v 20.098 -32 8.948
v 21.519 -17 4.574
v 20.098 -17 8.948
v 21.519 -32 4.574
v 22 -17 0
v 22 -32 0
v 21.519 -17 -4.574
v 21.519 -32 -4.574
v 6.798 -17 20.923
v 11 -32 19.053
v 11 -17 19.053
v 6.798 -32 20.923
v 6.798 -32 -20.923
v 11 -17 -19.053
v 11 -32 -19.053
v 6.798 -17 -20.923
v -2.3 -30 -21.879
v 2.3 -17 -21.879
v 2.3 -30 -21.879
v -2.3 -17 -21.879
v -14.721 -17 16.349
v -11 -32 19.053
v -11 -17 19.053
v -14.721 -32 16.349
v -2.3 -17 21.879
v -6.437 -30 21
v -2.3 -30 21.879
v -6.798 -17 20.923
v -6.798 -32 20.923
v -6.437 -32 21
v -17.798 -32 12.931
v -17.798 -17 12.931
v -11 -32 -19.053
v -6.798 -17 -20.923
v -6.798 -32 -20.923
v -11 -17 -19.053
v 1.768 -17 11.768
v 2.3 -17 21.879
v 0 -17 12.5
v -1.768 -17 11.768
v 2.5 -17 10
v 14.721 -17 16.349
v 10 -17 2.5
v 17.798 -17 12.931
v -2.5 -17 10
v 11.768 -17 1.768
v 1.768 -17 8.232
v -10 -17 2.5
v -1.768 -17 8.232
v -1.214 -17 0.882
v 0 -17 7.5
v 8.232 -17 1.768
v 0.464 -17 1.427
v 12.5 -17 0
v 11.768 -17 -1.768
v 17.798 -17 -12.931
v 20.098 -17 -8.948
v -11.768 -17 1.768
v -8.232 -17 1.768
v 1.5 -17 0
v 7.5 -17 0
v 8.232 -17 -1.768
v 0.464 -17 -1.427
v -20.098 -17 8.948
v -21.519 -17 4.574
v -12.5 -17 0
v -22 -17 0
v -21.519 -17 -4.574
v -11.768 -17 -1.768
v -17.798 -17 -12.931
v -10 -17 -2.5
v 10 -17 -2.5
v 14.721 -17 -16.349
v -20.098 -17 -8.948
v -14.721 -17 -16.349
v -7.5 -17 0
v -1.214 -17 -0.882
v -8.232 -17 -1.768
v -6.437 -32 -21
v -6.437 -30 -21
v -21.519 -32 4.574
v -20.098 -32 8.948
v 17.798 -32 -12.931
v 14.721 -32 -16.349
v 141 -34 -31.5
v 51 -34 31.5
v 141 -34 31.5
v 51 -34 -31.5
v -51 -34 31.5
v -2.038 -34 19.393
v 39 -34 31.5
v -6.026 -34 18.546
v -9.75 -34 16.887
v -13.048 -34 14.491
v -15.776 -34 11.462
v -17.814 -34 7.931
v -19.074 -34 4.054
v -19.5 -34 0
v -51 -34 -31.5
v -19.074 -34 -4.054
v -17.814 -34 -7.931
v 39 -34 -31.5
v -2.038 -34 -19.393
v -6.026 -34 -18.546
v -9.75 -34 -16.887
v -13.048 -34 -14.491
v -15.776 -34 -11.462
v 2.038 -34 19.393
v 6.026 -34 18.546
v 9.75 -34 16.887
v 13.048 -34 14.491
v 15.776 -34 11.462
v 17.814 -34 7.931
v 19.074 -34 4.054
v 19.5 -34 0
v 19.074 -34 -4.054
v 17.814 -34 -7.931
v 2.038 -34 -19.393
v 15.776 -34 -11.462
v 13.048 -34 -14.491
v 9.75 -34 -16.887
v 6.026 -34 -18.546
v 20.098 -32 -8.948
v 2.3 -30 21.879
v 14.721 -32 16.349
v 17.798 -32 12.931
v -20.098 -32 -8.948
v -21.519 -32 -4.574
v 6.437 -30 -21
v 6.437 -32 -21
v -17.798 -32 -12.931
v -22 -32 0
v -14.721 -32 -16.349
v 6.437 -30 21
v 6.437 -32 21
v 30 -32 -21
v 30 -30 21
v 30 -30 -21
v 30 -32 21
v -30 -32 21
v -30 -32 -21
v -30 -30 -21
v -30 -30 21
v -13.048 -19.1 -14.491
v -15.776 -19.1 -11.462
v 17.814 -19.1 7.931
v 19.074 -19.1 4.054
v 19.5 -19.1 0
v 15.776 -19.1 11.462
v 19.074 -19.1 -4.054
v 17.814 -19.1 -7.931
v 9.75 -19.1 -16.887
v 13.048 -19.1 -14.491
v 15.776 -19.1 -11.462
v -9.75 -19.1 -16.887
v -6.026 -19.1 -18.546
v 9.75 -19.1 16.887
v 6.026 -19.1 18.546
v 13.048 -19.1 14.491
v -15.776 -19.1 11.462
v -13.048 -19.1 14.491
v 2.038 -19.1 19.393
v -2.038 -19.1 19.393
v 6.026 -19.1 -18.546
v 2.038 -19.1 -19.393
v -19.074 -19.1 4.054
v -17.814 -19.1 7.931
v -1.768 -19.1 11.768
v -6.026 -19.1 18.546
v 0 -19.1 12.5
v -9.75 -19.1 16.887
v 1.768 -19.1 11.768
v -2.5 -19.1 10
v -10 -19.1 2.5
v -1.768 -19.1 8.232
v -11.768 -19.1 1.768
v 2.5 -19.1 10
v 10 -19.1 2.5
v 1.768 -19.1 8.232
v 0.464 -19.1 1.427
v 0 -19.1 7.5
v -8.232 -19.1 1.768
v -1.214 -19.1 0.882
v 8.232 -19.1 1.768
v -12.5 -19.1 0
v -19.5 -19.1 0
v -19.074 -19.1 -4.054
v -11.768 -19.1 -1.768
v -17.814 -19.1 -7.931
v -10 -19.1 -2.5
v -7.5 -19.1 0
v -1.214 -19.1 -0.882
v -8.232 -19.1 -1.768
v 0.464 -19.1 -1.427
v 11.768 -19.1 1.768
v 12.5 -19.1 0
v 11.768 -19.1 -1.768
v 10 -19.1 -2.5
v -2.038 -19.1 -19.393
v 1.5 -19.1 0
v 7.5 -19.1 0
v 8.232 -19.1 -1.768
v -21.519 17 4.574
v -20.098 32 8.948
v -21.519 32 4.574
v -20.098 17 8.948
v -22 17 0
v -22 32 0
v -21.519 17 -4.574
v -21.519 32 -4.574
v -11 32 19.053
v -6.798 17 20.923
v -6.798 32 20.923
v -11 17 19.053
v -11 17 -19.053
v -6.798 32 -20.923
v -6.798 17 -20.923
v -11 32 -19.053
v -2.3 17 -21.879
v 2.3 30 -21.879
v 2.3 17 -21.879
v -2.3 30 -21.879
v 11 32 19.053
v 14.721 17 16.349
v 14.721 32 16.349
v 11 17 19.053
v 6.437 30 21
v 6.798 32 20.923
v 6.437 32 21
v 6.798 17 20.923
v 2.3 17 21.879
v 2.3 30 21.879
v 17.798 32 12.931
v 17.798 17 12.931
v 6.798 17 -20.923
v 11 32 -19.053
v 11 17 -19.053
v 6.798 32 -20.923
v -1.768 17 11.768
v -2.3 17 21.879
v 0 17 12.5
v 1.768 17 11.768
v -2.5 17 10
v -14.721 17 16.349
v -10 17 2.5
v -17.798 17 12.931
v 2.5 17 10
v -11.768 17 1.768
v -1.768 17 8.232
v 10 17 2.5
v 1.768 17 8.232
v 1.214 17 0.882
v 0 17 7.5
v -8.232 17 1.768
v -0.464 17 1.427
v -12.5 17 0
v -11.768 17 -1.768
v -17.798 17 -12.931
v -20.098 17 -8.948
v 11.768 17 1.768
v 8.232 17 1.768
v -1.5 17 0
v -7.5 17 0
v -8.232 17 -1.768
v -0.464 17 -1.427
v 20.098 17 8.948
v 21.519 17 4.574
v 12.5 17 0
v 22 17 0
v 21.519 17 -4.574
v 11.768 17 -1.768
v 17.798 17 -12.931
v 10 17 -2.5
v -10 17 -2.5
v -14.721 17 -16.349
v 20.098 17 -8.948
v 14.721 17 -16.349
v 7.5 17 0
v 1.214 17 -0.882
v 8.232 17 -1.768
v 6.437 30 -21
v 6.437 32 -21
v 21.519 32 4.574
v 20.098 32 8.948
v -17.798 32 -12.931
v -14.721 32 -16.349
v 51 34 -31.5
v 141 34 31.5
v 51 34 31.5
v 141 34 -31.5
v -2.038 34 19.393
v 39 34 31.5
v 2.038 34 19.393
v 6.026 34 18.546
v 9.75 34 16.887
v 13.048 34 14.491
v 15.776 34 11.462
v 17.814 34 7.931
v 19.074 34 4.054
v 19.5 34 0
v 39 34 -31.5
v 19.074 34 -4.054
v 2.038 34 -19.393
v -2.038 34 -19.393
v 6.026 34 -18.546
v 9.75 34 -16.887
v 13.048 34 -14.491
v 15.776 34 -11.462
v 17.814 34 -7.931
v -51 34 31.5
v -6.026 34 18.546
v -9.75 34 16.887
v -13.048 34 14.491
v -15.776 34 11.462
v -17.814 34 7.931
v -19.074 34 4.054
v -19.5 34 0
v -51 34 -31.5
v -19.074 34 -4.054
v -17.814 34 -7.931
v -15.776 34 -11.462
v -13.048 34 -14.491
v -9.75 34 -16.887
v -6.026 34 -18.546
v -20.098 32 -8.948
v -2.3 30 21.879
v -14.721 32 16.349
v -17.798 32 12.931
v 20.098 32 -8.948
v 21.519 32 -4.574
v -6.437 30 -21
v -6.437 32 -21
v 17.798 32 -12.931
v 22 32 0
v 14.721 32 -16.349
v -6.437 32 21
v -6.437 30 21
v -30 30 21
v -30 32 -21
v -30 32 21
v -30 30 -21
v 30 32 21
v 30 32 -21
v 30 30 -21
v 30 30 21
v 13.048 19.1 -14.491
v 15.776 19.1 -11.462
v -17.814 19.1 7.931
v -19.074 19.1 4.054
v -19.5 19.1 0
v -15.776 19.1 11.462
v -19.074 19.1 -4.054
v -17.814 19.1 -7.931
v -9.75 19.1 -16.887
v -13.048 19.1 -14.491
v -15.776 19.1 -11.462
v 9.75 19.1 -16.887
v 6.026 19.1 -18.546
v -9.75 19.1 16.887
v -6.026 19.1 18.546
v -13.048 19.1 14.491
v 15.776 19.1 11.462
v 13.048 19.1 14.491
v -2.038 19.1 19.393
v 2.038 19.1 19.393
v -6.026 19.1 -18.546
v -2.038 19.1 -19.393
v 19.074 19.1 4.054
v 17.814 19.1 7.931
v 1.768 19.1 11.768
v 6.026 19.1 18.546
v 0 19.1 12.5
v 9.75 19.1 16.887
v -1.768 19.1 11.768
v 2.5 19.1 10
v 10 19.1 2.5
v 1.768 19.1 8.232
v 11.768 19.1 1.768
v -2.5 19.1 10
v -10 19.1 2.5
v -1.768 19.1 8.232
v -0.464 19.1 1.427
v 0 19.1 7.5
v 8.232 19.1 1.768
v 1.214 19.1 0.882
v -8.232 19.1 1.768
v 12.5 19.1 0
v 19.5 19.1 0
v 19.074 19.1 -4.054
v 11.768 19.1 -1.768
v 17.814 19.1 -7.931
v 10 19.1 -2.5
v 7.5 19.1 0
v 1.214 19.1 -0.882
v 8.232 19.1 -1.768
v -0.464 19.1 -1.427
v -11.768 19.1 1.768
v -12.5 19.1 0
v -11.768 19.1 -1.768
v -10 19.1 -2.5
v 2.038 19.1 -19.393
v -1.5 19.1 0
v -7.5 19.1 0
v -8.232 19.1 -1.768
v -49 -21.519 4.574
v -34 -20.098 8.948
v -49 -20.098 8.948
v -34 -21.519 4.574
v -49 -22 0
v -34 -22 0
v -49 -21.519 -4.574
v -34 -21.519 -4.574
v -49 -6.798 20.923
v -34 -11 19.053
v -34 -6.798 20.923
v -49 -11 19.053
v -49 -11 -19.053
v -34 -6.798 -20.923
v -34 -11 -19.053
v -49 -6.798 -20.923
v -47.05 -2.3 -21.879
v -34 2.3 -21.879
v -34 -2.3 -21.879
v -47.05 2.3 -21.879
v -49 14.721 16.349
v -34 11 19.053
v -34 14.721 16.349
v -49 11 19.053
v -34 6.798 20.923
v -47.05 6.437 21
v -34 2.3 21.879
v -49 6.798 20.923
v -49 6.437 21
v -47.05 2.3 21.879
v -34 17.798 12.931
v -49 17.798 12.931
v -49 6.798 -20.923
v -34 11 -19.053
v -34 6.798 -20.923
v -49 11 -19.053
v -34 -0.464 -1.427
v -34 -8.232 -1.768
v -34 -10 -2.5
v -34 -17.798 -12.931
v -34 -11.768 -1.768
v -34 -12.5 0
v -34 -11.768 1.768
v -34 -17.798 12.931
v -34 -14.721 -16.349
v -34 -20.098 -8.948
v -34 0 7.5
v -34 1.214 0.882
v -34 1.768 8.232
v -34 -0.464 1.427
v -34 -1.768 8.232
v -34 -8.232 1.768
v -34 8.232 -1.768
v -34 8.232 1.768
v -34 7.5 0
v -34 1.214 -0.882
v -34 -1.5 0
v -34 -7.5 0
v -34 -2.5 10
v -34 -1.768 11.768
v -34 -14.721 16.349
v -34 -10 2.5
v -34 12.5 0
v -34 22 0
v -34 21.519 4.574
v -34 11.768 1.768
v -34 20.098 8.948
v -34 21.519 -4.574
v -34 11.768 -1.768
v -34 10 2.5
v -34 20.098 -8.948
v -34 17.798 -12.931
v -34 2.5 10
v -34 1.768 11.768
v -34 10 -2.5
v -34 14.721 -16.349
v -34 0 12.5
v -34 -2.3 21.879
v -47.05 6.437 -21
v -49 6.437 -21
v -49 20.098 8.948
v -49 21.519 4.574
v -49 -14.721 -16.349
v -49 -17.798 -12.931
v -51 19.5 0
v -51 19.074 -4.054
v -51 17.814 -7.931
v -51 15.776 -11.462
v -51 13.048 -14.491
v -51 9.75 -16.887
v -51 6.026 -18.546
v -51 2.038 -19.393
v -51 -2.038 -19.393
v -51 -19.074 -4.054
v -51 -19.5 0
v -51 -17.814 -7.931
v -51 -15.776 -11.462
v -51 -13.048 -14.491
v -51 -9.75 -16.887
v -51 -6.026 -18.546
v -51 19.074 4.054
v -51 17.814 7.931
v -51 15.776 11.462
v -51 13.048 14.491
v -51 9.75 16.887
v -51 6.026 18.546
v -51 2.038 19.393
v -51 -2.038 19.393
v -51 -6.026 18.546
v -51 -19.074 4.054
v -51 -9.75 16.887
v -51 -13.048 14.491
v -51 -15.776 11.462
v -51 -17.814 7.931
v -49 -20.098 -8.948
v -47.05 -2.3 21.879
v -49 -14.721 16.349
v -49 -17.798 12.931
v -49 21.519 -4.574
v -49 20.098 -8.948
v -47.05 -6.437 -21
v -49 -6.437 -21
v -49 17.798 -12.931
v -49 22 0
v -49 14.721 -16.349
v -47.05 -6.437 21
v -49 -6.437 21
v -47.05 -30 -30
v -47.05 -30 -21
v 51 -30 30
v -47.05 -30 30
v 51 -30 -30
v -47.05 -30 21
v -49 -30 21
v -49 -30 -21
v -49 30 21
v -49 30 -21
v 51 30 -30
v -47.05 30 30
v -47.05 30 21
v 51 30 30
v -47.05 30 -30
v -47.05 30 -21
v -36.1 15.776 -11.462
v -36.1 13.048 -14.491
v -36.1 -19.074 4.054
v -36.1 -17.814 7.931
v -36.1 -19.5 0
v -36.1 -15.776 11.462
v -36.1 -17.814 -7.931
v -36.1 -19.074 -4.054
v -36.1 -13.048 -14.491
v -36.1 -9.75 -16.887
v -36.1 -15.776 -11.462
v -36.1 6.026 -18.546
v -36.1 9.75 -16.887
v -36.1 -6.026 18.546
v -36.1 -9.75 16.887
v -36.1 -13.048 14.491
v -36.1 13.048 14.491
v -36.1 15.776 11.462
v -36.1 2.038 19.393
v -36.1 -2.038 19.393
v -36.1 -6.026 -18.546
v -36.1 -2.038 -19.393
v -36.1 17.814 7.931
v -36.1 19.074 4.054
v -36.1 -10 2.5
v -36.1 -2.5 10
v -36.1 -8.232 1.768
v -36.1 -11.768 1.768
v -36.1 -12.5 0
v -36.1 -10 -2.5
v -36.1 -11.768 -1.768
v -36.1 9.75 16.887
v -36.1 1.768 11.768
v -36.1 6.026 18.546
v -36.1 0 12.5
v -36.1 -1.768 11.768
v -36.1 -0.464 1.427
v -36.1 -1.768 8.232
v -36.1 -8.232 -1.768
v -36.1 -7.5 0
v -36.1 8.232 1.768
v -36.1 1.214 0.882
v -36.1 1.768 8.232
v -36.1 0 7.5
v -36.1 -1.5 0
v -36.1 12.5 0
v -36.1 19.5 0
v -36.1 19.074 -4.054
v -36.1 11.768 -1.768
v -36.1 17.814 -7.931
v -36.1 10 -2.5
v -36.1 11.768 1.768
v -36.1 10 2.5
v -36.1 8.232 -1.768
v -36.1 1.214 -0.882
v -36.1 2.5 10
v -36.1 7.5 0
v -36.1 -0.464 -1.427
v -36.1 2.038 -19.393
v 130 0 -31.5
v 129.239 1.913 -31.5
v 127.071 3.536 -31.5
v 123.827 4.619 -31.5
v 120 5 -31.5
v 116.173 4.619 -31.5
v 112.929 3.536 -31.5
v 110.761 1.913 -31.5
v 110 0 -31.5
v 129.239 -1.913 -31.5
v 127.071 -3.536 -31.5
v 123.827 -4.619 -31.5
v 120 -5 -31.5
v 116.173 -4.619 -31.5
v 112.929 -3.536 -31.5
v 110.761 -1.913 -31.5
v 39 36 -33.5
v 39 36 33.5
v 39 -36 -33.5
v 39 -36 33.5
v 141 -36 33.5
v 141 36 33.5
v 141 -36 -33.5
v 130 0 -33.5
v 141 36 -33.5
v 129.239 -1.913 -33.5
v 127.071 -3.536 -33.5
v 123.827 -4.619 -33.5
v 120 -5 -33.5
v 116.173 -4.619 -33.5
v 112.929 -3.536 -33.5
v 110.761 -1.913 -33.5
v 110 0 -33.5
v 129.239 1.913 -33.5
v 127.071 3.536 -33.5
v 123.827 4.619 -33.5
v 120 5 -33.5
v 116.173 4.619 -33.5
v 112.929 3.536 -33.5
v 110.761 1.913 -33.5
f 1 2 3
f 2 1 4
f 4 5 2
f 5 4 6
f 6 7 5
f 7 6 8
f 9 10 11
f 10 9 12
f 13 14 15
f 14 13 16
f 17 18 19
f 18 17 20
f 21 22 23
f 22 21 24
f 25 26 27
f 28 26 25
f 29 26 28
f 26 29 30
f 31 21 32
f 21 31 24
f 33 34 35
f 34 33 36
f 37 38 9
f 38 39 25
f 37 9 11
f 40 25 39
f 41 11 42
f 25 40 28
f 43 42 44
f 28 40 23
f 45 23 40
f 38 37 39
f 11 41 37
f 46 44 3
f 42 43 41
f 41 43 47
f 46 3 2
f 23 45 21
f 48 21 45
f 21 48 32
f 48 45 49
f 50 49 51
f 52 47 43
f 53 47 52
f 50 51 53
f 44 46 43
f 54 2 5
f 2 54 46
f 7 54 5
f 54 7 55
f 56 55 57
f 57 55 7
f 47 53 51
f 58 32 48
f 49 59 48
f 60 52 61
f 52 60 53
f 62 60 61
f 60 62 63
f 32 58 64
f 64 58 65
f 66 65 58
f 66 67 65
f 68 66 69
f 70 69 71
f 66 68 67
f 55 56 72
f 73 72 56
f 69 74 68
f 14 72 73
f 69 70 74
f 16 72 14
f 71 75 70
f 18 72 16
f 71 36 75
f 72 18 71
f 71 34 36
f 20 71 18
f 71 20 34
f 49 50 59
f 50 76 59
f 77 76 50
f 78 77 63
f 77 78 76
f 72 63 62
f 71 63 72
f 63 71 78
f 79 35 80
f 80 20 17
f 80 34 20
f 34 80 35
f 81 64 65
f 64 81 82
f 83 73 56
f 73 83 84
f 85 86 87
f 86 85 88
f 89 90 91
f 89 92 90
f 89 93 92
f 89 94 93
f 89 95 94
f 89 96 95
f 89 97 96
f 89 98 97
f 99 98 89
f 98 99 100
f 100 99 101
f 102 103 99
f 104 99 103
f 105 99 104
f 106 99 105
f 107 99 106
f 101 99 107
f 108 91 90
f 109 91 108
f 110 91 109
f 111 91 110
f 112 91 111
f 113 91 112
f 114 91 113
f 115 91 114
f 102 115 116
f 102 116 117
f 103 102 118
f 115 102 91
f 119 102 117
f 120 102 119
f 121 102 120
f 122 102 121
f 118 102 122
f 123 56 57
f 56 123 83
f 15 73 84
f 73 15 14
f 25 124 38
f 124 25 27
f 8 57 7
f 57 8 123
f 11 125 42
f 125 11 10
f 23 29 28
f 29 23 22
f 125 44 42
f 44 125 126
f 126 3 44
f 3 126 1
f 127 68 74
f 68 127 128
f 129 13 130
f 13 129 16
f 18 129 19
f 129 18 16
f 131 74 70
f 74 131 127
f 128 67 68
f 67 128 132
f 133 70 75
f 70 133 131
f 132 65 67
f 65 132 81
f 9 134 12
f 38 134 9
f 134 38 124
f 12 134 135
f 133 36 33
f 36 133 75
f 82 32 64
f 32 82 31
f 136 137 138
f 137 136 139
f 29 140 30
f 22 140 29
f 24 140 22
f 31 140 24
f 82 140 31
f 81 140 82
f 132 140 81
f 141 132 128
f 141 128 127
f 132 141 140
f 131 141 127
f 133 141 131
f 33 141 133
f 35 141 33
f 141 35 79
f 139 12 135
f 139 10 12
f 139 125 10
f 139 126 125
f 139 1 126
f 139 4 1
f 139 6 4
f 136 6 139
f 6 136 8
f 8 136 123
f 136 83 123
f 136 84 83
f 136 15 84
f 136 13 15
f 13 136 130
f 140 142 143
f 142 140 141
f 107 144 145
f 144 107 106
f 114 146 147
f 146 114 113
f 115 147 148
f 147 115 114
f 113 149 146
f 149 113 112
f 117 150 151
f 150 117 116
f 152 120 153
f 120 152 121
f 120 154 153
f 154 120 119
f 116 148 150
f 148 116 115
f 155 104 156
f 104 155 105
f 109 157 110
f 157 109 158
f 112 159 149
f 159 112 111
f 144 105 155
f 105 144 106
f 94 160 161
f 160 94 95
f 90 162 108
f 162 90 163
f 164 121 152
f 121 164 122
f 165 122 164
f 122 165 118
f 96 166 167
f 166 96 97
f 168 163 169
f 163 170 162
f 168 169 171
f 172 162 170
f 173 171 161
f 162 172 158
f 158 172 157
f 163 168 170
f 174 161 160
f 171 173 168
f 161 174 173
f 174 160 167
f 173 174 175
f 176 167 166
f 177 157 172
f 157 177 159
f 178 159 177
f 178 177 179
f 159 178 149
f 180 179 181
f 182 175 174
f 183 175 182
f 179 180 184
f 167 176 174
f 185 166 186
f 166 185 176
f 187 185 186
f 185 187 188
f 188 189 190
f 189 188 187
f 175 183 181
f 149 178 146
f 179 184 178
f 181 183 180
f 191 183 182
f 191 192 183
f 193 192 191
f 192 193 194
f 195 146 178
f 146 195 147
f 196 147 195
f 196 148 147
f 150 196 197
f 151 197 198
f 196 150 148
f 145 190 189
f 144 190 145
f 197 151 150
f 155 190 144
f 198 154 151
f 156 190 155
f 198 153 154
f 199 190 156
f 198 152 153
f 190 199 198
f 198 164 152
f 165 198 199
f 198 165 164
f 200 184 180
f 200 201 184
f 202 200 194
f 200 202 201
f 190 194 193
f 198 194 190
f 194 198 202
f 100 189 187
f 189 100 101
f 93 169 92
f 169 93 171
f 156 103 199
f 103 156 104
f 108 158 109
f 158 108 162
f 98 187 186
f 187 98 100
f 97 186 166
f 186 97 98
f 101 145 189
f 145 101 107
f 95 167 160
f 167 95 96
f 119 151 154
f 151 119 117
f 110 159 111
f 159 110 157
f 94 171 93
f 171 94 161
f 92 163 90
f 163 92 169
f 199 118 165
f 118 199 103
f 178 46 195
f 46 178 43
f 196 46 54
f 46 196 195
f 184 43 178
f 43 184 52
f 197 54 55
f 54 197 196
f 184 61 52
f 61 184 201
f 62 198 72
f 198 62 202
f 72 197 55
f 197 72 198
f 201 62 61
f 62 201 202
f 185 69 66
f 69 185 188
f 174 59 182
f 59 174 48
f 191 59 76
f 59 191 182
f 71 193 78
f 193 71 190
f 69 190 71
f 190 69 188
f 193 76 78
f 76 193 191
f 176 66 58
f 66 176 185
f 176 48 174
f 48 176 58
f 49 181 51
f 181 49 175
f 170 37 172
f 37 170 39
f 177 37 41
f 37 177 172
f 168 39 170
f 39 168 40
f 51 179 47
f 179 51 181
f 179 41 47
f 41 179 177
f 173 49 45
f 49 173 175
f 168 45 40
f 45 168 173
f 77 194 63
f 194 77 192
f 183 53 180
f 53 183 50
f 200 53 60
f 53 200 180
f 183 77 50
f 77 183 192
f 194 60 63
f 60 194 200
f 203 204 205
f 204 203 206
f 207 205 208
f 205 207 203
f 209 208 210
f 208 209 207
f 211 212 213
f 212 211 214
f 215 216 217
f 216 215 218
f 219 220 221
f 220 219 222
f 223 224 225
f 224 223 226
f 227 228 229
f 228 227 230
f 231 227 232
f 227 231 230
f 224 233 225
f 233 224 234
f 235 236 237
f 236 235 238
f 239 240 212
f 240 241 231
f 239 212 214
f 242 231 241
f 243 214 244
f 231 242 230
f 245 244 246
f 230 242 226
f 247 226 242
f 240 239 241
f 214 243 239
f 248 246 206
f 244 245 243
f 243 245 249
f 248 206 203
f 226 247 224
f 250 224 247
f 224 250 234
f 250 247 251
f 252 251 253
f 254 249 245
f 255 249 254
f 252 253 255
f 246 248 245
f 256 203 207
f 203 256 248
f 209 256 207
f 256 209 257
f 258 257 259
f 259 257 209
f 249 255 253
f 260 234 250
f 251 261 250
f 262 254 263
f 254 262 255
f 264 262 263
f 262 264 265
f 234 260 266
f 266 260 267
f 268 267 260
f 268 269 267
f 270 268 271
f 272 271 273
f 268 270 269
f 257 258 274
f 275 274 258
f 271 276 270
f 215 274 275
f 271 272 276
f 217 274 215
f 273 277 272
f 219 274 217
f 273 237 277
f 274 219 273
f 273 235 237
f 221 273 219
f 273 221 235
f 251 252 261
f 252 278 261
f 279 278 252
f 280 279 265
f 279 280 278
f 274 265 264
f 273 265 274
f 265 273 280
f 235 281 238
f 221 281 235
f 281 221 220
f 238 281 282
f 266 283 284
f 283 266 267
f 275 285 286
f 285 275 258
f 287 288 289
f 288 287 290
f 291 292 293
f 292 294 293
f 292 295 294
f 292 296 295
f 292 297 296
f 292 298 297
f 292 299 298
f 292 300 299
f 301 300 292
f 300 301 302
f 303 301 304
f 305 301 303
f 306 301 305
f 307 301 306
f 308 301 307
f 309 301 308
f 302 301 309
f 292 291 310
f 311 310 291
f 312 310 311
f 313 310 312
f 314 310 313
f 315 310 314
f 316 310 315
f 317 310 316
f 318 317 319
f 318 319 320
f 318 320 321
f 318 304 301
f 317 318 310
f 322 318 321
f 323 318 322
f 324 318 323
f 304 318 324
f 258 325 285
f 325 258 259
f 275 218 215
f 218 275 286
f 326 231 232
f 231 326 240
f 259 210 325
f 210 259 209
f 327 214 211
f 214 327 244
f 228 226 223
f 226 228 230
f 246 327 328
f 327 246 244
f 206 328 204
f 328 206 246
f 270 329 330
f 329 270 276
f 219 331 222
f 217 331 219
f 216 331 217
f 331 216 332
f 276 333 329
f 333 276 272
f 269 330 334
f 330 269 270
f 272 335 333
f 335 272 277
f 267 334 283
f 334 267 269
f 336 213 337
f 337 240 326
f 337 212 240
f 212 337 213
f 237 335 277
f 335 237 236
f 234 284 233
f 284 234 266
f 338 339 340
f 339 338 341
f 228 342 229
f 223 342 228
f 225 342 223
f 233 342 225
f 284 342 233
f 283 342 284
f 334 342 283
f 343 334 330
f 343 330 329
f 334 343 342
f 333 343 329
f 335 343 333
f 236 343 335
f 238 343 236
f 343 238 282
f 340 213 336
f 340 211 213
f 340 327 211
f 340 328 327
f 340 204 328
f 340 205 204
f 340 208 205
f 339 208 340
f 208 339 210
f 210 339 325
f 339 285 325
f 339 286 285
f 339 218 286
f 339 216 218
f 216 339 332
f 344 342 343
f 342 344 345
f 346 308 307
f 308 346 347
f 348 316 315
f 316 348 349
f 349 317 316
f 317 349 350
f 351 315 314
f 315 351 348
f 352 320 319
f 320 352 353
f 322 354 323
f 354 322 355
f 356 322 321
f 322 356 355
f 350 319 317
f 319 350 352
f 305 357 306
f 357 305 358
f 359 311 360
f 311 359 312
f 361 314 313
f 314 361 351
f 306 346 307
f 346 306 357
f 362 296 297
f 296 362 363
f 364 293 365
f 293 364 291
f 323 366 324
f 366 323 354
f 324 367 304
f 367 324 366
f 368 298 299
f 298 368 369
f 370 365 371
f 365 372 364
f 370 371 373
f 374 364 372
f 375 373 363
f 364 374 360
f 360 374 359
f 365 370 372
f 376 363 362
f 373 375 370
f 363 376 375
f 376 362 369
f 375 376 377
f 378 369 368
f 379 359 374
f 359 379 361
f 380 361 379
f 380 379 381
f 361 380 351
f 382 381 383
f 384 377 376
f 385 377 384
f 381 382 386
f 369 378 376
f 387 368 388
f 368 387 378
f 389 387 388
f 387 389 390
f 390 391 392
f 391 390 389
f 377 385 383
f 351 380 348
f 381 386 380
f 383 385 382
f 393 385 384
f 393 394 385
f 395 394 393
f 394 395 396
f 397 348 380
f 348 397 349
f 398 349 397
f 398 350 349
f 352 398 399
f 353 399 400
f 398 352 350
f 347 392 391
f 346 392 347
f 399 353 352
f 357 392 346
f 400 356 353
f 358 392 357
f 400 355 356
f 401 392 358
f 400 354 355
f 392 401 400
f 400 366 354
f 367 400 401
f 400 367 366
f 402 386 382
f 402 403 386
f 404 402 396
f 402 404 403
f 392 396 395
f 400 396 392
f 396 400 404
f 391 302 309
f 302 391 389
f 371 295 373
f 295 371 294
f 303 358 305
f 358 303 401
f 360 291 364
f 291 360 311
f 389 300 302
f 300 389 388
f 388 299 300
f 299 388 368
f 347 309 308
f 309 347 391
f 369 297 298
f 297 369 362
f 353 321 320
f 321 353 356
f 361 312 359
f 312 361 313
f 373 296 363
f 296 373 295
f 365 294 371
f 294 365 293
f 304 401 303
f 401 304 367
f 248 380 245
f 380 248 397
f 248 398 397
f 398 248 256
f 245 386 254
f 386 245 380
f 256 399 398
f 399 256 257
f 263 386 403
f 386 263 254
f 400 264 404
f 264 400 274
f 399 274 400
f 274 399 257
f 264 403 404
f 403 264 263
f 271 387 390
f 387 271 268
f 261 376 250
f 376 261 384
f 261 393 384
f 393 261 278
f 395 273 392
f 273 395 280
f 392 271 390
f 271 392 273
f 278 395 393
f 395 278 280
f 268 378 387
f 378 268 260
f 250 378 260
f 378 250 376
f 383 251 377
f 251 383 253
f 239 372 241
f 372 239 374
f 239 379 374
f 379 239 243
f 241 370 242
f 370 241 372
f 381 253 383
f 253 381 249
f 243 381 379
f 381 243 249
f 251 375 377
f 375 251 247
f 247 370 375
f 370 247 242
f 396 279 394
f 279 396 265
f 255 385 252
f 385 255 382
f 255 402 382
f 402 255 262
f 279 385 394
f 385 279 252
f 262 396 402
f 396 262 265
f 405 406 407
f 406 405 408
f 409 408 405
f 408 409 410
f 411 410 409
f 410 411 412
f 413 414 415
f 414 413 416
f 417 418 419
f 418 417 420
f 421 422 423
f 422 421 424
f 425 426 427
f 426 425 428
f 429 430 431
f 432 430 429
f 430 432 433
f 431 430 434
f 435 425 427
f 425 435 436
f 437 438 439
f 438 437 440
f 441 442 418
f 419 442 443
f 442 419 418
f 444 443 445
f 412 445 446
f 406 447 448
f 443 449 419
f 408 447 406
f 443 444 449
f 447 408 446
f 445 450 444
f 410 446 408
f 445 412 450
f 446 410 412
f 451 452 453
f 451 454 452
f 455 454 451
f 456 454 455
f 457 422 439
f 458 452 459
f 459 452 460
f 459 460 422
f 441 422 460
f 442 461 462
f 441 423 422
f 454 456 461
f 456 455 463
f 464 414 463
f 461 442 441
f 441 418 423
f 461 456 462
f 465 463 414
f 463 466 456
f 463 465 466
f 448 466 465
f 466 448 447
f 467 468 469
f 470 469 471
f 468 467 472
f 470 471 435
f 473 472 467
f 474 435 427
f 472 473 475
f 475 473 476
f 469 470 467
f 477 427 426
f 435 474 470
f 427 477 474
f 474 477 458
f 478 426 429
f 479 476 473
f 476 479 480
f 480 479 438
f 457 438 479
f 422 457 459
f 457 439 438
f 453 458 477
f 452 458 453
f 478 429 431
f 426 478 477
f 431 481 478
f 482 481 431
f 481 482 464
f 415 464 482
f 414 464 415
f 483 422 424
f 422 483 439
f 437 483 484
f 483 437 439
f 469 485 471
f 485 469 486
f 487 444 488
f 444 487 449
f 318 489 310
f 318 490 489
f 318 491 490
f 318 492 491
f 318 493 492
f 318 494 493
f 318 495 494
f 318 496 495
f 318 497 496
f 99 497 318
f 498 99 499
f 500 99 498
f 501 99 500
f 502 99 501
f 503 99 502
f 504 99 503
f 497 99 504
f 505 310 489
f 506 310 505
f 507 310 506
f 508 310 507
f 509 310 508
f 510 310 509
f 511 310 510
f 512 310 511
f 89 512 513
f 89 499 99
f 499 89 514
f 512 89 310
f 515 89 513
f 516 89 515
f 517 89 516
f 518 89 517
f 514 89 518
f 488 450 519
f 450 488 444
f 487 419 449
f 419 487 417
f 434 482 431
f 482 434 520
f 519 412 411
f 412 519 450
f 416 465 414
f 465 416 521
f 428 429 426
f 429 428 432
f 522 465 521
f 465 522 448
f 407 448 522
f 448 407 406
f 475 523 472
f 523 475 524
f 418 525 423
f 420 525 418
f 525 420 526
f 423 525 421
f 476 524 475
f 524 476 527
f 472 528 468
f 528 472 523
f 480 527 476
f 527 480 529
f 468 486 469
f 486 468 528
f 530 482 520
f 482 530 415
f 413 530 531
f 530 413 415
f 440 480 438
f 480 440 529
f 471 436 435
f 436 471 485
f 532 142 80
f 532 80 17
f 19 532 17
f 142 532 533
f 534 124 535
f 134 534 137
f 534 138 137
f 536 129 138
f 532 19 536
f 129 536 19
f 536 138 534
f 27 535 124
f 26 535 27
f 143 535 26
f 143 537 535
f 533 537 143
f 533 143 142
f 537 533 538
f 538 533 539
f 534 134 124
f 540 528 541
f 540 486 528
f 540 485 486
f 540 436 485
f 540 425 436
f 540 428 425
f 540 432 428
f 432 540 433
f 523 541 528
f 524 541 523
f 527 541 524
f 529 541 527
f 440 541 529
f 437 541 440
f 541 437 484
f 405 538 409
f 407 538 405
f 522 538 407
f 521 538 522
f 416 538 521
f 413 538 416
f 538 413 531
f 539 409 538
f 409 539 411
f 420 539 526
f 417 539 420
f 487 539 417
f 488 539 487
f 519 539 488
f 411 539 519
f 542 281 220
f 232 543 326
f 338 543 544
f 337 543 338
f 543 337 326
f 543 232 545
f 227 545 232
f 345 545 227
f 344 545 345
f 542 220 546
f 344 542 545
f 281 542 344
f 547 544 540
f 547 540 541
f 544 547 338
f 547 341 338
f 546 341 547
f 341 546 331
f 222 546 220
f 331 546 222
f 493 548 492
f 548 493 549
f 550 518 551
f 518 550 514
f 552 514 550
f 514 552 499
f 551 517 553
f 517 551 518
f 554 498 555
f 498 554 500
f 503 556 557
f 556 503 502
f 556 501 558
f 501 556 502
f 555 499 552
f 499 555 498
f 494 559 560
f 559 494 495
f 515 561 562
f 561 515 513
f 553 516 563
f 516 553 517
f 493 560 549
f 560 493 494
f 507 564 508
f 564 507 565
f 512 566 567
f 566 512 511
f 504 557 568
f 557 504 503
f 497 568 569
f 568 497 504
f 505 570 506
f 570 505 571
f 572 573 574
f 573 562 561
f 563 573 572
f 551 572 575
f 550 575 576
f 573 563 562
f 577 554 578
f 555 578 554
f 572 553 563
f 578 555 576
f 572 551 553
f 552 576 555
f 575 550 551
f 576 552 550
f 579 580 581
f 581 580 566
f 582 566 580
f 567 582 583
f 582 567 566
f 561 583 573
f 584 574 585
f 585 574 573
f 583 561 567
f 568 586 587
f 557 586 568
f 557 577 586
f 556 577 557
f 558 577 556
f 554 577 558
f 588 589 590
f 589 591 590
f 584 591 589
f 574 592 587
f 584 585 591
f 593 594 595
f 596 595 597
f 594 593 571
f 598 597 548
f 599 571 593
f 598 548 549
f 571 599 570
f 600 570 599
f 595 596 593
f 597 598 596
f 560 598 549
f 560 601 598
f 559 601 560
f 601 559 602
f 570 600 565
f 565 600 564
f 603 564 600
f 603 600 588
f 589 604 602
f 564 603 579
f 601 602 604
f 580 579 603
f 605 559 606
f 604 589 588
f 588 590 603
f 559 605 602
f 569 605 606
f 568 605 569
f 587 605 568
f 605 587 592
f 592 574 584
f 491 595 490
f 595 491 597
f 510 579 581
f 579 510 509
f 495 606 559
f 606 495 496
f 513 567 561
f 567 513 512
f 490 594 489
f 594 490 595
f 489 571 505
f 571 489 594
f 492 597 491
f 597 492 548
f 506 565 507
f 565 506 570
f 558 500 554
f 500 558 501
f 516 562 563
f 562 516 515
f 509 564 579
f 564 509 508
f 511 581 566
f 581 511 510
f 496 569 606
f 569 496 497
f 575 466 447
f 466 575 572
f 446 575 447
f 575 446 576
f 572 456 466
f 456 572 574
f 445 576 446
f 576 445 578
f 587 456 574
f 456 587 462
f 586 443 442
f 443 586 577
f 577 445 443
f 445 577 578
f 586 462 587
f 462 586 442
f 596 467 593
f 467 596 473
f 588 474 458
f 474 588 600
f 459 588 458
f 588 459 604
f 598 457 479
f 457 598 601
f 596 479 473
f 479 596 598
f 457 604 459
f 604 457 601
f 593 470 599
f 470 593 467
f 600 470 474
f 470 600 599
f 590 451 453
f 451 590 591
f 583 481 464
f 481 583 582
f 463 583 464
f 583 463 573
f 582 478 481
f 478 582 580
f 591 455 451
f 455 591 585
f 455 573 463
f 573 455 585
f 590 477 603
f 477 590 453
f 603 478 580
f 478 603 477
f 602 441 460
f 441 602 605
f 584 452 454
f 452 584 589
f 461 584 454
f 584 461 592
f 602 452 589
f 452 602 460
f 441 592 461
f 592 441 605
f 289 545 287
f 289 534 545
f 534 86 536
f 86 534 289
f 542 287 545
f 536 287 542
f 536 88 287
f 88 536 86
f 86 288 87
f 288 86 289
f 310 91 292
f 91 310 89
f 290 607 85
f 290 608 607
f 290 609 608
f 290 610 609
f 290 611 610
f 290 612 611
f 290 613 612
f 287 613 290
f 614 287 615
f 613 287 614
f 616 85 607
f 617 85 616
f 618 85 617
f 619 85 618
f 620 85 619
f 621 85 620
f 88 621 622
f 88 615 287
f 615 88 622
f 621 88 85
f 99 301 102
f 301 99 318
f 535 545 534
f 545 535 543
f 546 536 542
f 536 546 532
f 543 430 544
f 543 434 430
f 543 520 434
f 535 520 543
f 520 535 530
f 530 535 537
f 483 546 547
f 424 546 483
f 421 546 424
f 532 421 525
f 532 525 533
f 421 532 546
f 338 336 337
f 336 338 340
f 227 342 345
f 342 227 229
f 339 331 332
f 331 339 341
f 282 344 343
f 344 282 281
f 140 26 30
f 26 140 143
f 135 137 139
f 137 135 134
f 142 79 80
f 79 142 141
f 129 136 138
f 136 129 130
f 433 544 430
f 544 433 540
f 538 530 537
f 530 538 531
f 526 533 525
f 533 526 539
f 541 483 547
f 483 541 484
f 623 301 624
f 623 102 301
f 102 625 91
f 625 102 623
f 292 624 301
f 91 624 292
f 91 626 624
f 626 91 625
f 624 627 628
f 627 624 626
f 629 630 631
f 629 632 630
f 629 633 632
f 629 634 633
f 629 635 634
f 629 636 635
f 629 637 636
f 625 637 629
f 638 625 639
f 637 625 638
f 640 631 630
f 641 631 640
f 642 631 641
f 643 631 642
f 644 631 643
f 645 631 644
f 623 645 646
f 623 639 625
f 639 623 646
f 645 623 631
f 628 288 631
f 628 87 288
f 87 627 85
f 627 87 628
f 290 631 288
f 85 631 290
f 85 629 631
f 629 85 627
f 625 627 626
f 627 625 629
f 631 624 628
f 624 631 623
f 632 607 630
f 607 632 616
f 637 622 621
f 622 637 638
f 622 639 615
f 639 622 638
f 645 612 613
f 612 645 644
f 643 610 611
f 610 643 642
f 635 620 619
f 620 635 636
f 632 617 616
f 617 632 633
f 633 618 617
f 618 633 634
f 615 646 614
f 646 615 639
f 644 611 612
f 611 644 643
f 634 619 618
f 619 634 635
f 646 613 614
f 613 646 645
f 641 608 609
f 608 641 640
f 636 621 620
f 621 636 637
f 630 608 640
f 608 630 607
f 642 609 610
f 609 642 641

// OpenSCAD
// file: outer_hull.scad
/* outer hull op 3 way electrical outlet*/

module outer_hull() {
	difference(){
		cube([102,72,67],center=true);
		cube([103,68,63],center=true);
		translate([-30,0,-34])scale([2,1,1])cylinder(4,5,5);
	}
}

outer_hull();
// file: inner_hull.scad
/*inner hull of a 3 way electrical outlet-*/

module inner_hull() {
	difference(){
		cube([102,68,63],center=true);
		translate([4,0,0]) cube([102.1,60,60],center=true);
		translate([-30,32.1,-30])cube([60,2,60]);
		translate([-30,-34.1,-30])cube([60,2,60]);
		translate([-30,29.7,-21])cube([60,3,42]);
		translate([-30,-32.9,-21])cube([60,3,42]);
		translate([-51.1,-30,-30])cube([2,60,60]);
		translate([-49.15,-30,-21])cube([3,60,42]);
	}
}

inner_hull();

/*end comment*/
// file: faceplate.scad
/* faceplate of electrical outlet */ 
module faceplate(){
   difference(){
      starting_block();
      translate([0,0,2.1])cylinder(15,19.5,19.5);   
      translate([10,0,-0.1])cylinder(3,2.5,2.5);
      translate([-10,0,-0.1])cylinder(3,2.5,2.5);
      translate([0,10,-0.1])cylinder(3,2.5,2.5);
      translate([0,0,-0.1])cylinder(3,1.5,1.5);
   }
}
module starting_block(){
   union (){
      cylinder(17,22,22);
      translate([-30,-30,15])cube([60,60,2]);
   }
}

faceplate();
// main file
// 	combine it all

use <faceplate.scad>;
use <inner_hull.scad>;
use <outer_hull.scad>;

module combined_inner() {
	translate([0,-17,0]) rotate([90,0,0]) faceplate();
	translate([0,17,0]) rotate([-90,180,0]) faceplate();
	rotate([90,0,0]) translate([-34,0,0]) rotate([0,-90,0]) faceplate();
	inner_hull();
}

module outlet(pos) {
	if (pos == 2) {
		combined_inner();
		translate([30,0,0]) rotate([0,0,180]) outer_hull();
		}	
	if (pos == 1) {
		combined_inner();
		translate([90,0,0]) rotate([0,0,180]) outer_hull();
		}
}

outlet(1); // 1: open
//outlet(2); // 2: close
